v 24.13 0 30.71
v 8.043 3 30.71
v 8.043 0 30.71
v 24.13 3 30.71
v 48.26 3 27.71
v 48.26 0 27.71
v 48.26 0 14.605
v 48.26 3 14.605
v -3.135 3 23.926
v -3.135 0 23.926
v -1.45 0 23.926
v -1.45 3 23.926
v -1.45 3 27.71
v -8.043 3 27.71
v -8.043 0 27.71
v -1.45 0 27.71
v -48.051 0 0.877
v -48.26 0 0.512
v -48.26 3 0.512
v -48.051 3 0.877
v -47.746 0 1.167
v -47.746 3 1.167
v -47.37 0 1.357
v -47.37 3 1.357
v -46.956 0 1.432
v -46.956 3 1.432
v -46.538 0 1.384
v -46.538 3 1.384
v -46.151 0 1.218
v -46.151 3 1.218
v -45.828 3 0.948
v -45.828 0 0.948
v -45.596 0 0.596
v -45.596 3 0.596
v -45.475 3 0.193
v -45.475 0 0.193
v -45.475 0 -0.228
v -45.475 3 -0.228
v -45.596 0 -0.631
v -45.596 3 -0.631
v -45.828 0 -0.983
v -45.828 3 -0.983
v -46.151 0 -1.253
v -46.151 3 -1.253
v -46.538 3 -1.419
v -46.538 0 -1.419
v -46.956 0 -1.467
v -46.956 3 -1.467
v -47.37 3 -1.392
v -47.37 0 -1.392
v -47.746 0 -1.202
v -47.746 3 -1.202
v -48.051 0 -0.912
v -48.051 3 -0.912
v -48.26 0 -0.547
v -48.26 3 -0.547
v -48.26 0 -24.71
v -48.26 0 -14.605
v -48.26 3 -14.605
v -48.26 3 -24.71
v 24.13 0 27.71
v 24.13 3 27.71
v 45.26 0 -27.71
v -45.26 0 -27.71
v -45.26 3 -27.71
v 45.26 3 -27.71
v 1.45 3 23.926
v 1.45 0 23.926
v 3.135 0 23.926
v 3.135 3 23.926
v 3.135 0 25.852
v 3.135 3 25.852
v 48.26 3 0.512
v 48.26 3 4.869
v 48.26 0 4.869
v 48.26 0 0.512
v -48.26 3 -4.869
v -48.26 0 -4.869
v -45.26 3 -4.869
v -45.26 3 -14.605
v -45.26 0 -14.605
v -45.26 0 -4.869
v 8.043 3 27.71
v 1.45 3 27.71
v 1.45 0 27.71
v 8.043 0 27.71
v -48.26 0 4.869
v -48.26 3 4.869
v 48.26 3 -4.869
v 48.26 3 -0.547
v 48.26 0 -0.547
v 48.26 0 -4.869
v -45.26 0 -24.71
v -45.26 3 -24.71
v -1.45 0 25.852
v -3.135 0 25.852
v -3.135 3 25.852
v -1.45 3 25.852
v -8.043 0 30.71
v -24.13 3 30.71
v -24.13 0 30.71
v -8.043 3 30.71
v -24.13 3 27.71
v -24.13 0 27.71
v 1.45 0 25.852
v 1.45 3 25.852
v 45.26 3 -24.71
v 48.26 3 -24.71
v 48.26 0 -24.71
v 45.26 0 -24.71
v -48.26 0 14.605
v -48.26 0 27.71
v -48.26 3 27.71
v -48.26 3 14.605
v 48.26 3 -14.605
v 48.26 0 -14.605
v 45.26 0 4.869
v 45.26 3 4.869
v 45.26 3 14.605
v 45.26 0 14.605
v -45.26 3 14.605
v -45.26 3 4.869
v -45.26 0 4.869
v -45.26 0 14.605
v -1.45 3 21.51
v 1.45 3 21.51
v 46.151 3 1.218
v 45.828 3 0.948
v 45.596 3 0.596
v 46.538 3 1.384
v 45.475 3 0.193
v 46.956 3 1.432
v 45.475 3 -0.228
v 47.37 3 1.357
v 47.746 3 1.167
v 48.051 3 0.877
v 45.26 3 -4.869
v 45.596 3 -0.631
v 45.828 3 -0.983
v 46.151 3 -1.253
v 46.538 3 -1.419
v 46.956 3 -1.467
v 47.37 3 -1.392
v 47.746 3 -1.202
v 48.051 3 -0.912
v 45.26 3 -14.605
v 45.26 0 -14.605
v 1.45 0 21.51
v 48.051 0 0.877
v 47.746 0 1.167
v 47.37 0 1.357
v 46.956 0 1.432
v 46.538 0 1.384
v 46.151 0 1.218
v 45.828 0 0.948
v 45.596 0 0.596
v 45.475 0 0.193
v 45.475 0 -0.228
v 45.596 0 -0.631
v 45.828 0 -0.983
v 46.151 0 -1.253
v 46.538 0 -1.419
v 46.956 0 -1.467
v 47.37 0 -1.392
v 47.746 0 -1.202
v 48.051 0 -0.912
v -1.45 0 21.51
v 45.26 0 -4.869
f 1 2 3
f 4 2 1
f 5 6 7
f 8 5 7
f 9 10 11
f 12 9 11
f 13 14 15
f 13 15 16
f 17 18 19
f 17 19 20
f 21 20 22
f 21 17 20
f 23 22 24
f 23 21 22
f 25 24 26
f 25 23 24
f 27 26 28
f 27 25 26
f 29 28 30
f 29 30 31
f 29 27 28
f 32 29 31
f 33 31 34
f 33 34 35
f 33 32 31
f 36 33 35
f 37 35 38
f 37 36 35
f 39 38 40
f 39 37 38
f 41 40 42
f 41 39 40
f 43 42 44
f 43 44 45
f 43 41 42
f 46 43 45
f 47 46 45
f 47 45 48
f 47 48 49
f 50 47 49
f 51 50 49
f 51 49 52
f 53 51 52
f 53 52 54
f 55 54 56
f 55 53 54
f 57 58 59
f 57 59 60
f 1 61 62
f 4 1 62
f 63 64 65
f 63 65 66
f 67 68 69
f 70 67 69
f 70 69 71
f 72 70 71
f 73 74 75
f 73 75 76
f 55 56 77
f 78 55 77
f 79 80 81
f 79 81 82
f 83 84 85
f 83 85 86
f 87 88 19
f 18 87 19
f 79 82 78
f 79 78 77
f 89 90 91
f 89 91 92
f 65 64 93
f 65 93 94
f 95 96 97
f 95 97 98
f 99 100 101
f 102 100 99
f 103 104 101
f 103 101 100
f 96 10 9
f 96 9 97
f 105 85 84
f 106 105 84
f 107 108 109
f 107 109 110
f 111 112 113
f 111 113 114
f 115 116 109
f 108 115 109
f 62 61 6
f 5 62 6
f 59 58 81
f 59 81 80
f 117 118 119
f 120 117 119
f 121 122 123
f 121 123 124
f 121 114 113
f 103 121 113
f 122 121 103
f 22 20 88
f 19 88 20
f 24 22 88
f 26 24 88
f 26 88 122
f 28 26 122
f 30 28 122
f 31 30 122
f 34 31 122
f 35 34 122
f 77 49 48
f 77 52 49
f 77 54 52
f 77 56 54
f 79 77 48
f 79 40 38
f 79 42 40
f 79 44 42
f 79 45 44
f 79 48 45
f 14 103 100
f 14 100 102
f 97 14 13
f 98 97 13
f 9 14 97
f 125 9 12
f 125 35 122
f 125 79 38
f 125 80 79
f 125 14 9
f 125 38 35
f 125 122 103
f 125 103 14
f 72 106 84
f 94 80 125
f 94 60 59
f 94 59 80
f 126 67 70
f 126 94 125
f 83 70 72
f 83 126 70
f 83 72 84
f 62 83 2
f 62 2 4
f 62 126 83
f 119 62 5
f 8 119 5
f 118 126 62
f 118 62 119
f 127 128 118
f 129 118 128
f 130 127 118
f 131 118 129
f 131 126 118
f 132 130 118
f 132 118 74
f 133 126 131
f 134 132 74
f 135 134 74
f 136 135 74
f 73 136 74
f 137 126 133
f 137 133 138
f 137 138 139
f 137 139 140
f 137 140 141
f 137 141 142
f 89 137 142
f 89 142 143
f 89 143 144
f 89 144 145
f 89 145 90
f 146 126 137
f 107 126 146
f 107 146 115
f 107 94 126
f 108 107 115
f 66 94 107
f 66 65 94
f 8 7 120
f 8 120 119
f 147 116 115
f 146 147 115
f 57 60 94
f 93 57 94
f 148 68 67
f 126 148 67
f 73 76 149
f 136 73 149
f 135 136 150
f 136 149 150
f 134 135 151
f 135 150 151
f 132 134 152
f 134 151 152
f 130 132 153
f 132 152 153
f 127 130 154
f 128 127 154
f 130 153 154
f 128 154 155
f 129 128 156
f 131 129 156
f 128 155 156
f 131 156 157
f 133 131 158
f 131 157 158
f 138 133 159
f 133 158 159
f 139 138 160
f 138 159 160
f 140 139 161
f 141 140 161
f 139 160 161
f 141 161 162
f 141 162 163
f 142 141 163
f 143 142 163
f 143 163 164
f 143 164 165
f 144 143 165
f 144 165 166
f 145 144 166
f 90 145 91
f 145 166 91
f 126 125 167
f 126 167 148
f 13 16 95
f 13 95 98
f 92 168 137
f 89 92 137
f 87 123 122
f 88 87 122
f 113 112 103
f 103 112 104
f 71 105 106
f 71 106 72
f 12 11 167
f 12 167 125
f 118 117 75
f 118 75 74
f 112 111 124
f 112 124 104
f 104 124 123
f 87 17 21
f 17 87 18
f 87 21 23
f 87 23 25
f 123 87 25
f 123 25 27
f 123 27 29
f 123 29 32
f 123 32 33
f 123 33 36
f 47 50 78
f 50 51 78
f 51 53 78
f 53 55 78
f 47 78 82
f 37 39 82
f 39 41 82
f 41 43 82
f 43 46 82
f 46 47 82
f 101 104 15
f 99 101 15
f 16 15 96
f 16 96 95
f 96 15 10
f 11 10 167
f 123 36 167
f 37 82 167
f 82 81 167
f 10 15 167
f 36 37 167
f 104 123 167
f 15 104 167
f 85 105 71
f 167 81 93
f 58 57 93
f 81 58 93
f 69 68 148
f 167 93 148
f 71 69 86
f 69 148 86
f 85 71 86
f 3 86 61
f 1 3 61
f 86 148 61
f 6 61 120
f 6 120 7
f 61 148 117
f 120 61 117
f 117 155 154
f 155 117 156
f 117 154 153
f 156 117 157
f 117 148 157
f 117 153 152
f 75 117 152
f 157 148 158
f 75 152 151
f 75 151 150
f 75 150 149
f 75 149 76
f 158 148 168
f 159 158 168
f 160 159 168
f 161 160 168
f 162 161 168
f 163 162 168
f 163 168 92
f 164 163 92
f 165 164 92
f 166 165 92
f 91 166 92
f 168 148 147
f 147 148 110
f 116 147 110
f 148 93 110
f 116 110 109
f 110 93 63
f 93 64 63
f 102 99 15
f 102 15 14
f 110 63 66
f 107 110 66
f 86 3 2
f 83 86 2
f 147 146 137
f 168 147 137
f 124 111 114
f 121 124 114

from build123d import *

# Parameters (mm, degrees)
SKETCH2_W           = 96.52
SKETCH2_H           = 55.42
BOSS_EXTRUDE1_DEPTH = 3
SKETCH3_W           = 29.21
SKETCH3_H           = 3
CUT_EXTRUDE1_DEPTH  = 3
SKETCH5_W           = 48.26
SKETCH5_H           = 3
BOSS_EXTRUDE2_DEPTH = 3
SKETCH14_W          = 16.086666666
SKETCH14_H          = 3
CUT_EXTRUDE2_DEPTH  = 3
SKETCH15_W          = 9.737913064
SKETCH15_H          = 3
BOSS_EXTRUDE9_DEPTH = 3
SKETCH26_W          = 3
SKETCH26_H          = 3
CUT_EXTRUDE4_DEPTH  = 3
CUT_EXTRUDE5_DEPTH  = 3
SKETCH29_W          = 2.9
SKETCH29_H          = 3
CUT_EXTRUDE6_DEPTH  = 6.2
SKETCH30_W          = 6.27
SKETCH30_H          = 1.926429006
CUT_EXTRUDE7_DEPTH  = 3


with BuildPart() as part:
    # Sketch2 → Boss-Extrude1 (new body)
    with BuildSketch(Plane(origin=(0, 0, 0), x_dir=(1, 0, 0), z_dir=(0, 1, 0))):
        Rectangle(SKETCH2_W, SKETCH2_H)
    extrude(amount=BOSS_EXTRUDE1_DEPTH)

    # Sketch3 → Cut-Extrude1 (cut)
    with BuildSketch(Plane.ZY.offset(48.26)):
        with Locations((0, 1.5)):
            Rectangle(SKETCH3_W, SKETCH3_H)
    cut_extrude1 = extrude(amount=-CUT_EXTRUDE1_DEPTH, mode=Mode.SUBTRACT)

    # Mirror1: Cut-Extrude1 across plane
    add(cut_extrude1.mirror(Plane(origin=(0, 0, 0), x_dir=(0, 0, 1), z_dir=(1, 0, 0))), mode=Mode.SUBTRACT)

    # Sketch5 → Boss-Extrude2 (add)
    with BuildSketch(Plane.XY.offset(27.71)):
        with Locations((0, 1.5)):
            Rectangle(SKETCH5_W, SKETCH5_H)
    extrude(amount=BOSS_EXTRUDE2_DEPTH)

    # Sketch14 → Cut-Extrude2 (cut)
    with BuildSketch(Plane.XY.offset(30.71)):
        with Locations((0, 1.5)):
            Rectangle(SKETCH14_W, SKETCH14_H)
    extrude(amount=-CUT_EXTRUDE2_DEPTH, mode=Mode.SUBTRACT)

    # Sketch15 → Boss-Extrude9 (add)
    with BuildSketch(Plane(origin=(45.26, 0, 0), x_dir=(0, 0, -1), z_dir=(1, 0, 0))):
        with Locations((0, 1.5)):
            Rectangle(SKETCH15_W, SKETCH15_H)
    boss_extrude9 = extrude(amount=BOSS_EXTRUDE9_DEPTH)

    # Mirror2: Boss-Extrude9 across plane
    add(boss_extrude9.mirror(Plane(origin=(0, 0, 0), x_dir=(0, 0, 1), z_dir=(1, 0, 0))))

    # Sketch26 → Cut-Extrude4 (cut)
    with BuildSketch(Plane(origin=(0, 0, -27.71), x_dir=(-1, 0, 0), z_dir=(0, 0, -1))):
        with Locations((-46.76, 1.5)):
            Rectangle(SKETCH26_W, SKETCH26_H)
    cut_extrude4 = extrude(amount=-CUT_EXTRUDE4_DEPTH, mode=Mode.SUBTRACT)

    # Mirror3: Cut-Extrude4 across plane
    add(cut_extrude4.mirror(Plane(origin=(0, 0, 0), x_dir=(0, 0, 1), z_dir=(1, 0, 0))), mode=Mode.SUBTRACT)

    # Sketch27 → Cut-Extrude5 (cut)
    with BuildSketch(Plane.XZ):
        with BuildLine():
            ThreePointArc((48.26, -0.546659717), (48.334780685, -0.286767695), (48.36, -0.017509454))
            ThreePointArc((48.36, -0.017509454), (48.334780685, 0.251748786), (48.26, 0.511640808))
            Line((48.26, 0.511640808), (48.26, -0.546659717))
        make_face()
        with BuildLine():
            Line((48.26, -0.546659717), (48.26, 0.511640808))
            ThreePointArc((48.26, 0.511640808), (45.46, -0.017509454), (48.26, -0.546659717))
        make_face()
    cut_extrude5 = extrude(amount=-CUT_EXTRUDE5_DEPTH, mode=Mode.SUBTRACT)

    # Mirror4: Cut-Extrude5 across plane
    add(cut_extrude5.mirror(Plane(origin=(0, 0, 0), x_dir=(0, 0, 1), z_dir=(1, 0, 0))), mode=Mode.SUBTRACT)

    # Sketch29 → Cut-Extrude6 (cut)
    with BuildSketch(Plane.XY.offset(27.71)):
        with Locations((0, 1.5)):
            Rectangle(SKETCH29_W, SKETCH29_H)
    extrude(amount=-CUT_EXTRUDE6_DEPTH, mode=Mode.SUBTRACT)

    # Sketch30 → Cut-Extrude7 (cut)
    with BuildSketch(Plane.XZ):
        with Locations((0, 24.88885073)):
            Rectangle(SKETCH30_W, SKETCH30_H)
    extrude(amount=-CUT_EXTRUDE7_DEPTH, mode=Mode.SUBTRACT)


solid = part.part
